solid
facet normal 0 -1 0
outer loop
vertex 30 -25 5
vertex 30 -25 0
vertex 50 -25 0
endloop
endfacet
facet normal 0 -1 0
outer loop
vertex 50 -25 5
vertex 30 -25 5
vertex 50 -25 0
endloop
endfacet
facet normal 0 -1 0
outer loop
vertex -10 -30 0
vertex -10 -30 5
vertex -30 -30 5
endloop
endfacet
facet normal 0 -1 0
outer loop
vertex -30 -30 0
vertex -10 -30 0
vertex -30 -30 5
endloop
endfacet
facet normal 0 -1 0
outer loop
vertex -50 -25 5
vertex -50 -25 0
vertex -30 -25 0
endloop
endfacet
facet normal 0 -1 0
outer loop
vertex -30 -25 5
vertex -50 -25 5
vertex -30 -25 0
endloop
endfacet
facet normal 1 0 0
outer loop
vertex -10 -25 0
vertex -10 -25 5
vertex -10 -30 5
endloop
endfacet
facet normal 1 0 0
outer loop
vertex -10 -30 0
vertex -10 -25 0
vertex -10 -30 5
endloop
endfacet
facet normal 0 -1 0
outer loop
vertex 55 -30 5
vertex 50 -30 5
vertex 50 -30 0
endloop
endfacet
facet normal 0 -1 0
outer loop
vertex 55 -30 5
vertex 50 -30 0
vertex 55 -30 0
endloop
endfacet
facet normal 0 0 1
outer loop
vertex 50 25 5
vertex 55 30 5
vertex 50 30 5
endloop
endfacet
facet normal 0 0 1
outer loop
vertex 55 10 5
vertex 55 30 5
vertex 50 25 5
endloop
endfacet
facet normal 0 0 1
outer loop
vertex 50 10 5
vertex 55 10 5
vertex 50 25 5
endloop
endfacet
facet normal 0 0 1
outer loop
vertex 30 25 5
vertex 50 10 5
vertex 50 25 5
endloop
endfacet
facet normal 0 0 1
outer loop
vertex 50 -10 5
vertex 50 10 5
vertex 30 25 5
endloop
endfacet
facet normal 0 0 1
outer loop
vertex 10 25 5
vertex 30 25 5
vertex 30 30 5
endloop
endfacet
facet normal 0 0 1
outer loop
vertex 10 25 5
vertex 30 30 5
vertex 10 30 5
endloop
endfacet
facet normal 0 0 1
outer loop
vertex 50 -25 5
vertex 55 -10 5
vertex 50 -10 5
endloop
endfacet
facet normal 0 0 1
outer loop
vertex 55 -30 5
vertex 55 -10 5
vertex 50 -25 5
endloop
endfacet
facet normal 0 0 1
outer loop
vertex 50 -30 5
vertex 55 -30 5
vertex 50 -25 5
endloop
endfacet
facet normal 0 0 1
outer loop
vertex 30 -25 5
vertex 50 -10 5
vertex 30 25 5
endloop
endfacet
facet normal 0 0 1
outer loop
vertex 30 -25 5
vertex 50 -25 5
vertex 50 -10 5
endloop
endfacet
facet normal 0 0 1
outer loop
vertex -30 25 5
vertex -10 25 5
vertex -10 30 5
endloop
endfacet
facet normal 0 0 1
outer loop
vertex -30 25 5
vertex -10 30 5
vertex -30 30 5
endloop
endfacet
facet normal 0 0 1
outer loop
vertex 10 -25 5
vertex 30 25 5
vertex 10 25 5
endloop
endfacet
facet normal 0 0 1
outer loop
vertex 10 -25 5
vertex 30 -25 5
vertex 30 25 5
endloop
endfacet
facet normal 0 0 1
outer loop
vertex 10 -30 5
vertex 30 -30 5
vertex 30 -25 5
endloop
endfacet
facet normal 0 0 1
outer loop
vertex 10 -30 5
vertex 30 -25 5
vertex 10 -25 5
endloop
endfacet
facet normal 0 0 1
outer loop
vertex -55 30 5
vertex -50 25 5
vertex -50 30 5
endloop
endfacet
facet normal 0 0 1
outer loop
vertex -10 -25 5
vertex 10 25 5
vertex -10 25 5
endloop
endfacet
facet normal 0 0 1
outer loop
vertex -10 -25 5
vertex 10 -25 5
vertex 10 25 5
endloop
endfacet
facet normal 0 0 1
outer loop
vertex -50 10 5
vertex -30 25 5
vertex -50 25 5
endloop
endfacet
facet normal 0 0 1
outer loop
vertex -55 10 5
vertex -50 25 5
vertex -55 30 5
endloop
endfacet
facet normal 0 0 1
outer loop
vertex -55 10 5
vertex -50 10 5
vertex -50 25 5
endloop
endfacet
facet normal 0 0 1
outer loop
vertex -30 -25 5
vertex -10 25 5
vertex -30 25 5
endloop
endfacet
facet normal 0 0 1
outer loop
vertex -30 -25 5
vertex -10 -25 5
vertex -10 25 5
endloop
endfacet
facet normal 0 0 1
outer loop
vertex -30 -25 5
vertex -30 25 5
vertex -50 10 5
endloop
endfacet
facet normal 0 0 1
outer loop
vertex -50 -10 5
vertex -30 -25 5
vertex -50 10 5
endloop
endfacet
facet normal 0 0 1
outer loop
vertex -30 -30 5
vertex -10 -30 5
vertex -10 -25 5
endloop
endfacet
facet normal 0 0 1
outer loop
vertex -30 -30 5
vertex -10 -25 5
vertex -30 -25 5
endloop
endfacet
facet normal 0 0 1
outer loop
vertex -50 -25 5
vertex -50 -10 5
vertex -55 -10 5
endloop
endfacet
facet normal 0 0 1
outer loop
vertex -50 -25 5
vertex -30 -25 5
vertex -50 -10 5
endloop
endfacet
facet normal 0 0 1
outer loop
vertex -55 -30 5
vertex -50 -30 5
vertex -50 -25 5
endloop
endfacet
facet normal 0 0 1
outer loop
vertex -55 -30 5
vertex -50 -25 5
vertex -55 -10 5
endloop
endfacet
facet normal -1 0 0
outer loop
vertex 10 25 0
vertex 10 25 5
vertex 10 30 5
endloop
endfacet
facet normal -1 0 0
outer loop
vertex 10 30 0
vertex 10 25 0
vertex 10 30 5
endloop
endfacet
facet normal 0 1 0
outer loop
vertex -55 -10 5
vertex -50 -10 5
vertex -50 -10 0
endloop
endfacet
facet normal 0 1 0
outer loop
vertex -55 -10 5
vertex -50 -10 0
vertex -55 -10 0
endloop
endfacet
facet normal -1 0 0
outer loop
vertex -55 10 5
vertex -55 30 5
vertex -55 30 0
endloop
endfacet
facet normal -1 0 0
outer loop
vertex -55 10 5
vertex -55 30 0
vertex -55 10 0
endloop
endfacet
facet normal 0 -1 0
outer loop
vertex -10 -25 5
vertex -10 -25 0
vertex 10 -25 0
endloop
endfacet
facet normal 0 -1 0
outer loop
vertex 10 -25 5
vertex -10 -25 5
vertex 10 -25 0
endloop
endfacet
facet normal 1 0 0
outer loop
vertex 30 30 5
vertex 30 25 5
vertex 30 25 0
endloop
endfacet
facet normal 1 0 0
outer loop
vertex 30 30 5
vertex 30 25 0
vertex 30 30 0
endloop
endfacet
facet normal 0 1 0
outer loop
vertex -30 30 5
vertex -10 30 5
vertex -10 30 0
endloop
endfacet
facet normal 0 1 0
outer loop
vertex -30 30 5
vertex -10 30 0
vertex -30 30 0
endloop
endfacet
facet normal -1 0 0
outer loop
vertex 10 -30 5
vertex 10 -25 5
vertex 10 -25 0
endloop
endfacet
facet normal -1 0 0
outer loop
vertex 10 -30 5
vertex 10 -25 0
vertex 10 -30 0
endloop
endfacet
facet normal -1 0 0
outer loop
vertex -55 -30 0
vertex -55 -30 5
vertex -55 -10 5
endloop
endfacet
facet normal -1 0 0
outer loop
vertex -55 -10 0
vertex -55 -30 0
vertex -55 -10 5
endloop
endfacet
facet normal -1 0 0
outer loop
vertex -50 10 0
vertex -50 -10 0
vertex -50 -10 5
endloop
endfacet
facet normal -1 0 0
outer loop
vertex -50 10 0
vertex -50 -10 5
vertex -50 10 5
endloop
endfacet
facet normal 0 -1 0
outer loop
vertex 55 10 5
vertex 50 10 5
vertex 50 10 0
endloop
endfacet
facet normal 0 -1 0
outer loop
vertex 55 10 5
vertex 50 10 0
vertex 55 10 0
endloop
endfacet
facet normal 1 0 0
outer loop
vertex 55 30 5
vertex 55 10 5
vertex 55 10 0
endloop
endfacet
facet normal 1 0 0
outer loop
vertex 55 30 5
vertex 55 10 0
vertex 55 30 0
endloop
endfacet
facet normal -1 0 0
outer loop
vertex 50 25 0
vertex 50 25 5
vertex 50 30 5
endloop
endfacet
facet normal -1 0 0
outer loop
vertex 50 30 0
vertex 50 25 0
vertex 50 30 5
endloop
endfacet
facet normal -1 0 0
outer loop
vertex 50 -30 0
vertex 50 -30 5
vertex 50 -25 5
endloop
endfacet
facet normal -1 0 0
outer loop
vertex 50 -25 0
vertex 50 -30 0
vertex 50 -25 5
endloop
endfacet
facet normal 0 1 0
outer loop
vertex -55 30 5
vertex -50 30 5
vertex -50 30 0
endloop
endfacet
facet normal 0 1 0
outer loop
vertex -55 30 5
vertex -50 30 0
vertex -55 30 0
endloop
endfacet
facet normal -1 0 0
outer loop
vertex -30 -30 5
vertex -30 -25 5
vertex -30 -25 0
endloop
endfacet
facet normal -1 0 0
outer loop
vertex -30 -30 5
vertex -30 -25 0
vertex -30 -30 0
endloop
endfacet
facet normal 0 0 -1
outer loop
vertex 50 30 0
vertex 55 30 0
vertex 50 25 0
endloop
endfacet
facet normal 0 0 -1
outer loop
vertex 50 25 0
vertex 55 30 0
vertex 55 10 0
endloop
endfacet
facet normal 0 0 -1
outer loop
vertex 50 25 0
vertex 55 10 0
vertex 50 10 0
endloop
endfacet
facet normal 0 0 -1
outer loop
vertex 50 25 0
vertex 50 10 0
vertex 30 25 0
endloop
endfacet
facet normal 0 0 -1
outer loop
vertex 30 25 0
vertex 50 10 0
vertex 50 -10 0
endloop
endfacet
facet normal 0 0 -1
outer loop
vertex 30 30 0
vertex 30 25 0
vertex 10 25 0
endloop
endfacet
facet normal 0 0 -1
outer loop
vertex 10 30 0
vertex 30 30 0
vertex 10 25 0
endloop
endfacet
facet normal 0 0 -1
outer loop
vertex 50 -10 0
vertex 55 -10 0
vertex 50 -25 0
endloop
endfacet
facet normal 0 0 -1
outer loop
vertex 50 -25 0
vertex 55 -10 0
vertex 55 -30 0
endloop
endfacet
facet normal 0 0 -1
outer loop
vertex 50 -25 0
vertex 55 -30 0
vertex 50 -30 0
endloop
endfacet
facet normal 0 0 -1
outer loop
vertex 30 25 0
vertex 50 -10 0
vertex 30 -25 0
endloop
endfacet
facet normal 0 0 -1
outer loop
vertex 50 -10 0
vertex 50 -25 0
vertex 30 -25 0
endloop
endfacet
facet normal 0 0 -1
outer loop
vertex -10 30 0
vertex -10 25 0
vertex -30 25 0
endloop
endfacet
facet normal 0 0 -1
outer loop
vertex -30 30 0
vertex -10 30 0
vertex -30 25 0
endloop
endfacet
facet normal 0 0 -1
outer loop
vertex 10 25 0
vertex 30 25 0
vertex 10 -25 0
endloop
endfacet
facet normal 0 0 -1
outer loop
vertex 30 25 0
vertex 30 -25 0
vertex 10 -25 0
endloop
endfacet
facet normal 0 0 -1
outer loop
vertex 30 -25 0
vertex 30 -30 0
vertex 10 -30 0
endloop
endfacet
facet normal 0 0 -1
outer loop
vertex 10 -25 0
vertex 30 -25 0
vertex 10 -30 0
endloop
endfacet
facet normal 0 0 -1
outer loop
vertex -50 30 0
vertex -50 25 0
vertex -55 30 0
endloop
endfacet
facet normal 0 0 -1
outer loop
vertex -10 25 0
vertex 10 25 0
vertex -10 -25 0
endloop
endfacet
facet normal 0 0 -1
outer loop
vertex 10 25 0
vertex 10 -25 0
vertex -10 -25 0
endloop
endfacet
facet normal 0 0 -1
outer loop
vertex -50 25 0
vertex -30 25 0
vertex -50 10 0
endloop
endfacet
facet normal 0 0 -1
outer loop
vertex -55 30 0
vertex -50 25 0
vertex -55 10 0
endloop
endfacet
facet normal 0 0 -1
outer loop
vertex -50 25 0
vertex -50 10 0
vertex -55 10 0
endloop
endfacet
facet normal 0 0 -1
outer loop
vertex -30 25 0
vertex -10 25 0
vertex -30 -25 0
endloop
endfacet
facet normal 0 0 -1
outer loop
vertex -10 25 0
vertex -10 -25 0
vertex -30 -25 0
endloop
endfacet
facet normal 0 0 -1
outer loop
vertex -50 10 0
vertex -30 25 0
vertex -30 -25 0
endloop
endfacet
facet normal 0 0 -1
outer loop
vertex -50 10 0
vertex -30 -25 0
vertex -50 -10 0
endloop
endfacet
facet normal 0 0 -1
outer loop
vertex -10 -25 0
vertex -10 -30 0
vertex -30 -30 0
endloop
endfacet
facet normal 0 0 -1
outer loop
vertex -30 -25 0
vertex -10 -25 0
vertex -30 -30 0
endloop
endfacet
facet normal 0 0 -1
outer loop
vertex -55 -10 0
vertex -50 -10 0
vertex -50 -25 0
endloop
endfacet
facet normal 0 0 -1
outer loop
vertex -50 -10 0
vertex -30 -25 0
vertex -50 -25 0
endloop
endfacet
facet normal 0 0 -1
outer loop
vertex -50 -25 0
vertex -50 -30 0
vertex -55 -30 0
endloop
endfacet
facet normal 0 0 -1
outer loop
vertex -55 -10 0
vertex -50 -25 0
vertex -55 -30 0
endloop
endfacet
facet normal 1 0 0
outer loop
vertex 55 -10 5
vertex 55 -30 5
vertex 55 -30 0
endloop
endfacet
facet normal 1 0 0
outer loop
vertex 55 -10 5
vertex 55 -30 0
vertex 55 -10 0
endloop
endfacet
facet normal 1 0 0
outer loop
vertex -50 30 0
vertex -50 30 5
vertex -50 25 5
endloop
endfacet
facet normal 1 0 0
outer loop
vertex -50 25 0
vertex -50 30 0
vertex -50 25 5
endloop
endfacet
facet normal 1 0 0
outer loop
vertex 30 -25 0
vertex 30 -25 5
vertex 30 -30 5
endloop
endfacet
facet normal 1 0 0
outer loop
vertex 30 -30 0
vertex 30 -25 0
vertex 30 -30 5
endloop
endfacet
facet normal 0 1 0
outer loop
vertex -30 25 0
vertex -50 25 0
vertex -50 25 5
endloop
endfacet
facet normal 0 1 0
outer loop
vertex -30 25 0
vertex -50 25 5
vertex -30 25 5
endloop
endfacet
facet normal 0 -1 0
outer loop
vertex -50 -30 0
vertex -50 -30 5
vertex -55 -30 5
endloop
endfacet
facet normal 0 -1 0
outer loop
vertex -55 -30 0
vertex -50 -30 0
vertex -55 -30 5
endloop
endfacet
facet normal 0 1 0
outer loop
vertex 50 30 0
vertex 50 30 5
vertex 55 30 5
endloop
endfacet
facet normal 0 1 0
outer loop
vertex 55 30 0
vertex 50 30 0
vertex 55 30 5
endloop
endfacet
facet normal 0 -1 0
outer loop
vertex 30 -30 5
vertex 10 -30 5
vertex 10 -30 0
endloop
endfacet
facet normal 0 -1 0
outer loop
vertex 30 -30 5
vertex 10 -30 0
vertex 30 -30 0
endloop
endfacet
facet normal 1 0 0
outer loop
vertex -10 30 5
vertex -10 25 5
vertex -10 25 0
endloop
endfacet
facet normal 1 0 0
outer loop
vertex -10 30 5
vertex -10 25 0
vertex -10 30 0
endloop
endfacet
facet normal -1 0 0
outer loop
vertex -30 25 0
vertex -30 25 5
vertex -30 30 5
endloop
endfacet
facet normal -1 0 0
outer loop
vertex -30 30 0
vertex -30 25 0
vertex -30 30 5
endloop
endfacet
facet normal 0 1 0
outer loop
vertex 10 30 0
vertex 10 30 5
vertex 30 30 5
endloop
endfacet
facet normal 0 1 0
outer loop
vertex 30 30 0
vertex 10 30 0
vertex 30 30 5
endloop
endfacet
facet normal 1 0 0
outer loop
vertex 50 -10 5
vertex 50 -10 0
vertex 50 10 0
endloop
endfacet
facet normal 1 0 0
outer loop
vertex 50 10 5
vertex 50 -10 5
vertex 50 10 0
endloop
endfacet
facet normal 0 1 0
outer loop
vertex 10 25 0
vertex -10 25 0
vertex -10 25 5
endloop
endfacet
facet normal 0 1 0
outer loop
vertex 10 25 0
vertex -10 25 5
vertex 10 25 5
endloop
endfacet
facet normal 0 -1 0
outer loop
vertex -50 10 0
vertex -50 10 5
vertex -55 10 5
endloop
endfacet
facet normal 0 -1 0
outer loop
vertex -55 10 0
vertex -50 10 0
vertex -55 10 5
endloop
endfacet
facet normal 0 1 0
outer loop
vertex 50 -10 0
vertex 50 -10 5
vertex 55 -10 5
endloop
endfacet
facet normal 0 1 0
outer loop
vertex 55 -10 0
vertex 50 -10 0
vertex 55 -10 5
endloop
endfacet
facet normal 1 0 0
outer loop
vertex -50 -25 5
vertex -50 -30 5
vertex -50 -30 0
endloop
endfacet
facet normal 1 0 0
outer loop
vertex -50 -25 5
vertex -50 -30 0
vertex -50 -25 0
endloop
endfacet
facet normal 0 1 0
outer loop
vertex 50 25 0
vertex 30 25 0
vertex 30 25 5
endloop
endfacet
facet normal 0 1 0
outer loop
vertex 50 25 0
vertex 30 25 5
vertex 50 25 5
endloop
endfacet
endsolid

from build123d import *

# Parameters (mm, degrees)
SKETCH_1_W                       = 100
SKETCH_1_H                       = 50
EXTRUDE_1_DEPTH                  = 5
SKETCH_2_W                       = 5
SKETCH_2_H                       = 20
EXTRUDE_2_DEPTH                  = 5
SKETCH_3_W                       = 20
SKETCH_3_H                       = 5
EXTRUDE_3_DEPTH                  = 5
MIRROR_3_COPY_1_SKETCH_W         = 20
MIRROR_3_COPY_1_SKETCH_H         = 5
MIRROR_3_COPY_1_DEPTH            = 5
PATTERN_LINEAR_2_COUNT           = 2
PATTERN_LINEAR_2_PITCH           = 40
PATTERN_LINEAR_2_COPY_1_SKETCH_W = 5
PATTERN_LINEAR_2_COPY_1_SKETCH_H = 20
PATTERN_LINEAR_2_COPY_1_DEPTH    = 5


with BuildPart() as part:
    # 스케치1 → 보스-돌출1 (new body)
    with BuildSketch(Plane.XY):
        Rectangle(SKETCH_1_W, SKETCH_1_H)
    extrude(amount=EXTRUDE_1_DEPTH)

    # 스케치2 → 보스-돌출2 (add)
    with BuildSketch(Plane.XY.offset(5)):
        with Locations((52.5, -20)):
            Rectangle(SKETCH_2_W, SKETCH_2_H)
    extrude_2 = extrude(amount=-EXTRUDE_2_DEPTH)

    # 대칭 복사1: 보스-돌출2 across plane
    add(extrude_2.mirror(Plane(origin=(0, 0, 0), x_dir=(0, 0, 1), z_dir=(1, 0, 0))))

    # 스케치3 → 보스-돌출3 (add)
    with BuildSketch(Plane.XY.offset(5)):
        with Locations((20, 27.5)):
            Rectangle(SKETCH_3_W, SKETCH_3_H)
    extrude_3 = extrude(amount=-EXTRUDE_3_DEPTH)

    # 대칭 복사2: 보스-돌출3 across plane
    add(extrude_3.mirror(Plane(origin=(0, 0, 0), x_dir=(0, 0, 1), z_dir=(1, 0, 0))))

    # 대칭 복사3: 보스-돌출3 across plane
    add(extrude_3.mirror(Plane.ZX))

    # 대칭 복사3 copy 1 sketch → 대칭 복사3 copy 1 (add)
    with BuildSketch(Plane(origin=(0, 0, 5), x_dir=(-1, 0, 0), z_dir=(0, 0, 1))):
        with Locations((20, 27.5)):
            Rectangle(MIRROR_3_COPY_1_SKETCH_W, MIRROR_3_COPY_1_SKETCH_H)
    extrude(amount=-MIRROR_3_COPY_1_DEPTH)

    # 선형 패턴2: 보스-돌출2 ×2
    with Locations(*[(0, i * PATTERN_LINEAR_2_PITCH, 0) for i in range(1, PATTERN_LINEAR_2_COUNT)]):
        add(extrude_2)

    # 선형 패턴2 copy 1 sketch → 선형 패턴2 copy 1 (add)
    with BuildSketch(Plane(origin=(0, 40, 5), x_dir=(-1, 0, 0), z_dir=(0, 0, 1))):
        with Locations((52.5, 20)):
            Rectangle(PATTERN_LINEAR_2_COPY_1_SKETCH_W, PATTERN_LINEAR_2_COPY_1_SKETCH_H)
    extrude(amount=-PATTERN_LINEAR_2_COPY_1_DEPTH)


solid = part.part
